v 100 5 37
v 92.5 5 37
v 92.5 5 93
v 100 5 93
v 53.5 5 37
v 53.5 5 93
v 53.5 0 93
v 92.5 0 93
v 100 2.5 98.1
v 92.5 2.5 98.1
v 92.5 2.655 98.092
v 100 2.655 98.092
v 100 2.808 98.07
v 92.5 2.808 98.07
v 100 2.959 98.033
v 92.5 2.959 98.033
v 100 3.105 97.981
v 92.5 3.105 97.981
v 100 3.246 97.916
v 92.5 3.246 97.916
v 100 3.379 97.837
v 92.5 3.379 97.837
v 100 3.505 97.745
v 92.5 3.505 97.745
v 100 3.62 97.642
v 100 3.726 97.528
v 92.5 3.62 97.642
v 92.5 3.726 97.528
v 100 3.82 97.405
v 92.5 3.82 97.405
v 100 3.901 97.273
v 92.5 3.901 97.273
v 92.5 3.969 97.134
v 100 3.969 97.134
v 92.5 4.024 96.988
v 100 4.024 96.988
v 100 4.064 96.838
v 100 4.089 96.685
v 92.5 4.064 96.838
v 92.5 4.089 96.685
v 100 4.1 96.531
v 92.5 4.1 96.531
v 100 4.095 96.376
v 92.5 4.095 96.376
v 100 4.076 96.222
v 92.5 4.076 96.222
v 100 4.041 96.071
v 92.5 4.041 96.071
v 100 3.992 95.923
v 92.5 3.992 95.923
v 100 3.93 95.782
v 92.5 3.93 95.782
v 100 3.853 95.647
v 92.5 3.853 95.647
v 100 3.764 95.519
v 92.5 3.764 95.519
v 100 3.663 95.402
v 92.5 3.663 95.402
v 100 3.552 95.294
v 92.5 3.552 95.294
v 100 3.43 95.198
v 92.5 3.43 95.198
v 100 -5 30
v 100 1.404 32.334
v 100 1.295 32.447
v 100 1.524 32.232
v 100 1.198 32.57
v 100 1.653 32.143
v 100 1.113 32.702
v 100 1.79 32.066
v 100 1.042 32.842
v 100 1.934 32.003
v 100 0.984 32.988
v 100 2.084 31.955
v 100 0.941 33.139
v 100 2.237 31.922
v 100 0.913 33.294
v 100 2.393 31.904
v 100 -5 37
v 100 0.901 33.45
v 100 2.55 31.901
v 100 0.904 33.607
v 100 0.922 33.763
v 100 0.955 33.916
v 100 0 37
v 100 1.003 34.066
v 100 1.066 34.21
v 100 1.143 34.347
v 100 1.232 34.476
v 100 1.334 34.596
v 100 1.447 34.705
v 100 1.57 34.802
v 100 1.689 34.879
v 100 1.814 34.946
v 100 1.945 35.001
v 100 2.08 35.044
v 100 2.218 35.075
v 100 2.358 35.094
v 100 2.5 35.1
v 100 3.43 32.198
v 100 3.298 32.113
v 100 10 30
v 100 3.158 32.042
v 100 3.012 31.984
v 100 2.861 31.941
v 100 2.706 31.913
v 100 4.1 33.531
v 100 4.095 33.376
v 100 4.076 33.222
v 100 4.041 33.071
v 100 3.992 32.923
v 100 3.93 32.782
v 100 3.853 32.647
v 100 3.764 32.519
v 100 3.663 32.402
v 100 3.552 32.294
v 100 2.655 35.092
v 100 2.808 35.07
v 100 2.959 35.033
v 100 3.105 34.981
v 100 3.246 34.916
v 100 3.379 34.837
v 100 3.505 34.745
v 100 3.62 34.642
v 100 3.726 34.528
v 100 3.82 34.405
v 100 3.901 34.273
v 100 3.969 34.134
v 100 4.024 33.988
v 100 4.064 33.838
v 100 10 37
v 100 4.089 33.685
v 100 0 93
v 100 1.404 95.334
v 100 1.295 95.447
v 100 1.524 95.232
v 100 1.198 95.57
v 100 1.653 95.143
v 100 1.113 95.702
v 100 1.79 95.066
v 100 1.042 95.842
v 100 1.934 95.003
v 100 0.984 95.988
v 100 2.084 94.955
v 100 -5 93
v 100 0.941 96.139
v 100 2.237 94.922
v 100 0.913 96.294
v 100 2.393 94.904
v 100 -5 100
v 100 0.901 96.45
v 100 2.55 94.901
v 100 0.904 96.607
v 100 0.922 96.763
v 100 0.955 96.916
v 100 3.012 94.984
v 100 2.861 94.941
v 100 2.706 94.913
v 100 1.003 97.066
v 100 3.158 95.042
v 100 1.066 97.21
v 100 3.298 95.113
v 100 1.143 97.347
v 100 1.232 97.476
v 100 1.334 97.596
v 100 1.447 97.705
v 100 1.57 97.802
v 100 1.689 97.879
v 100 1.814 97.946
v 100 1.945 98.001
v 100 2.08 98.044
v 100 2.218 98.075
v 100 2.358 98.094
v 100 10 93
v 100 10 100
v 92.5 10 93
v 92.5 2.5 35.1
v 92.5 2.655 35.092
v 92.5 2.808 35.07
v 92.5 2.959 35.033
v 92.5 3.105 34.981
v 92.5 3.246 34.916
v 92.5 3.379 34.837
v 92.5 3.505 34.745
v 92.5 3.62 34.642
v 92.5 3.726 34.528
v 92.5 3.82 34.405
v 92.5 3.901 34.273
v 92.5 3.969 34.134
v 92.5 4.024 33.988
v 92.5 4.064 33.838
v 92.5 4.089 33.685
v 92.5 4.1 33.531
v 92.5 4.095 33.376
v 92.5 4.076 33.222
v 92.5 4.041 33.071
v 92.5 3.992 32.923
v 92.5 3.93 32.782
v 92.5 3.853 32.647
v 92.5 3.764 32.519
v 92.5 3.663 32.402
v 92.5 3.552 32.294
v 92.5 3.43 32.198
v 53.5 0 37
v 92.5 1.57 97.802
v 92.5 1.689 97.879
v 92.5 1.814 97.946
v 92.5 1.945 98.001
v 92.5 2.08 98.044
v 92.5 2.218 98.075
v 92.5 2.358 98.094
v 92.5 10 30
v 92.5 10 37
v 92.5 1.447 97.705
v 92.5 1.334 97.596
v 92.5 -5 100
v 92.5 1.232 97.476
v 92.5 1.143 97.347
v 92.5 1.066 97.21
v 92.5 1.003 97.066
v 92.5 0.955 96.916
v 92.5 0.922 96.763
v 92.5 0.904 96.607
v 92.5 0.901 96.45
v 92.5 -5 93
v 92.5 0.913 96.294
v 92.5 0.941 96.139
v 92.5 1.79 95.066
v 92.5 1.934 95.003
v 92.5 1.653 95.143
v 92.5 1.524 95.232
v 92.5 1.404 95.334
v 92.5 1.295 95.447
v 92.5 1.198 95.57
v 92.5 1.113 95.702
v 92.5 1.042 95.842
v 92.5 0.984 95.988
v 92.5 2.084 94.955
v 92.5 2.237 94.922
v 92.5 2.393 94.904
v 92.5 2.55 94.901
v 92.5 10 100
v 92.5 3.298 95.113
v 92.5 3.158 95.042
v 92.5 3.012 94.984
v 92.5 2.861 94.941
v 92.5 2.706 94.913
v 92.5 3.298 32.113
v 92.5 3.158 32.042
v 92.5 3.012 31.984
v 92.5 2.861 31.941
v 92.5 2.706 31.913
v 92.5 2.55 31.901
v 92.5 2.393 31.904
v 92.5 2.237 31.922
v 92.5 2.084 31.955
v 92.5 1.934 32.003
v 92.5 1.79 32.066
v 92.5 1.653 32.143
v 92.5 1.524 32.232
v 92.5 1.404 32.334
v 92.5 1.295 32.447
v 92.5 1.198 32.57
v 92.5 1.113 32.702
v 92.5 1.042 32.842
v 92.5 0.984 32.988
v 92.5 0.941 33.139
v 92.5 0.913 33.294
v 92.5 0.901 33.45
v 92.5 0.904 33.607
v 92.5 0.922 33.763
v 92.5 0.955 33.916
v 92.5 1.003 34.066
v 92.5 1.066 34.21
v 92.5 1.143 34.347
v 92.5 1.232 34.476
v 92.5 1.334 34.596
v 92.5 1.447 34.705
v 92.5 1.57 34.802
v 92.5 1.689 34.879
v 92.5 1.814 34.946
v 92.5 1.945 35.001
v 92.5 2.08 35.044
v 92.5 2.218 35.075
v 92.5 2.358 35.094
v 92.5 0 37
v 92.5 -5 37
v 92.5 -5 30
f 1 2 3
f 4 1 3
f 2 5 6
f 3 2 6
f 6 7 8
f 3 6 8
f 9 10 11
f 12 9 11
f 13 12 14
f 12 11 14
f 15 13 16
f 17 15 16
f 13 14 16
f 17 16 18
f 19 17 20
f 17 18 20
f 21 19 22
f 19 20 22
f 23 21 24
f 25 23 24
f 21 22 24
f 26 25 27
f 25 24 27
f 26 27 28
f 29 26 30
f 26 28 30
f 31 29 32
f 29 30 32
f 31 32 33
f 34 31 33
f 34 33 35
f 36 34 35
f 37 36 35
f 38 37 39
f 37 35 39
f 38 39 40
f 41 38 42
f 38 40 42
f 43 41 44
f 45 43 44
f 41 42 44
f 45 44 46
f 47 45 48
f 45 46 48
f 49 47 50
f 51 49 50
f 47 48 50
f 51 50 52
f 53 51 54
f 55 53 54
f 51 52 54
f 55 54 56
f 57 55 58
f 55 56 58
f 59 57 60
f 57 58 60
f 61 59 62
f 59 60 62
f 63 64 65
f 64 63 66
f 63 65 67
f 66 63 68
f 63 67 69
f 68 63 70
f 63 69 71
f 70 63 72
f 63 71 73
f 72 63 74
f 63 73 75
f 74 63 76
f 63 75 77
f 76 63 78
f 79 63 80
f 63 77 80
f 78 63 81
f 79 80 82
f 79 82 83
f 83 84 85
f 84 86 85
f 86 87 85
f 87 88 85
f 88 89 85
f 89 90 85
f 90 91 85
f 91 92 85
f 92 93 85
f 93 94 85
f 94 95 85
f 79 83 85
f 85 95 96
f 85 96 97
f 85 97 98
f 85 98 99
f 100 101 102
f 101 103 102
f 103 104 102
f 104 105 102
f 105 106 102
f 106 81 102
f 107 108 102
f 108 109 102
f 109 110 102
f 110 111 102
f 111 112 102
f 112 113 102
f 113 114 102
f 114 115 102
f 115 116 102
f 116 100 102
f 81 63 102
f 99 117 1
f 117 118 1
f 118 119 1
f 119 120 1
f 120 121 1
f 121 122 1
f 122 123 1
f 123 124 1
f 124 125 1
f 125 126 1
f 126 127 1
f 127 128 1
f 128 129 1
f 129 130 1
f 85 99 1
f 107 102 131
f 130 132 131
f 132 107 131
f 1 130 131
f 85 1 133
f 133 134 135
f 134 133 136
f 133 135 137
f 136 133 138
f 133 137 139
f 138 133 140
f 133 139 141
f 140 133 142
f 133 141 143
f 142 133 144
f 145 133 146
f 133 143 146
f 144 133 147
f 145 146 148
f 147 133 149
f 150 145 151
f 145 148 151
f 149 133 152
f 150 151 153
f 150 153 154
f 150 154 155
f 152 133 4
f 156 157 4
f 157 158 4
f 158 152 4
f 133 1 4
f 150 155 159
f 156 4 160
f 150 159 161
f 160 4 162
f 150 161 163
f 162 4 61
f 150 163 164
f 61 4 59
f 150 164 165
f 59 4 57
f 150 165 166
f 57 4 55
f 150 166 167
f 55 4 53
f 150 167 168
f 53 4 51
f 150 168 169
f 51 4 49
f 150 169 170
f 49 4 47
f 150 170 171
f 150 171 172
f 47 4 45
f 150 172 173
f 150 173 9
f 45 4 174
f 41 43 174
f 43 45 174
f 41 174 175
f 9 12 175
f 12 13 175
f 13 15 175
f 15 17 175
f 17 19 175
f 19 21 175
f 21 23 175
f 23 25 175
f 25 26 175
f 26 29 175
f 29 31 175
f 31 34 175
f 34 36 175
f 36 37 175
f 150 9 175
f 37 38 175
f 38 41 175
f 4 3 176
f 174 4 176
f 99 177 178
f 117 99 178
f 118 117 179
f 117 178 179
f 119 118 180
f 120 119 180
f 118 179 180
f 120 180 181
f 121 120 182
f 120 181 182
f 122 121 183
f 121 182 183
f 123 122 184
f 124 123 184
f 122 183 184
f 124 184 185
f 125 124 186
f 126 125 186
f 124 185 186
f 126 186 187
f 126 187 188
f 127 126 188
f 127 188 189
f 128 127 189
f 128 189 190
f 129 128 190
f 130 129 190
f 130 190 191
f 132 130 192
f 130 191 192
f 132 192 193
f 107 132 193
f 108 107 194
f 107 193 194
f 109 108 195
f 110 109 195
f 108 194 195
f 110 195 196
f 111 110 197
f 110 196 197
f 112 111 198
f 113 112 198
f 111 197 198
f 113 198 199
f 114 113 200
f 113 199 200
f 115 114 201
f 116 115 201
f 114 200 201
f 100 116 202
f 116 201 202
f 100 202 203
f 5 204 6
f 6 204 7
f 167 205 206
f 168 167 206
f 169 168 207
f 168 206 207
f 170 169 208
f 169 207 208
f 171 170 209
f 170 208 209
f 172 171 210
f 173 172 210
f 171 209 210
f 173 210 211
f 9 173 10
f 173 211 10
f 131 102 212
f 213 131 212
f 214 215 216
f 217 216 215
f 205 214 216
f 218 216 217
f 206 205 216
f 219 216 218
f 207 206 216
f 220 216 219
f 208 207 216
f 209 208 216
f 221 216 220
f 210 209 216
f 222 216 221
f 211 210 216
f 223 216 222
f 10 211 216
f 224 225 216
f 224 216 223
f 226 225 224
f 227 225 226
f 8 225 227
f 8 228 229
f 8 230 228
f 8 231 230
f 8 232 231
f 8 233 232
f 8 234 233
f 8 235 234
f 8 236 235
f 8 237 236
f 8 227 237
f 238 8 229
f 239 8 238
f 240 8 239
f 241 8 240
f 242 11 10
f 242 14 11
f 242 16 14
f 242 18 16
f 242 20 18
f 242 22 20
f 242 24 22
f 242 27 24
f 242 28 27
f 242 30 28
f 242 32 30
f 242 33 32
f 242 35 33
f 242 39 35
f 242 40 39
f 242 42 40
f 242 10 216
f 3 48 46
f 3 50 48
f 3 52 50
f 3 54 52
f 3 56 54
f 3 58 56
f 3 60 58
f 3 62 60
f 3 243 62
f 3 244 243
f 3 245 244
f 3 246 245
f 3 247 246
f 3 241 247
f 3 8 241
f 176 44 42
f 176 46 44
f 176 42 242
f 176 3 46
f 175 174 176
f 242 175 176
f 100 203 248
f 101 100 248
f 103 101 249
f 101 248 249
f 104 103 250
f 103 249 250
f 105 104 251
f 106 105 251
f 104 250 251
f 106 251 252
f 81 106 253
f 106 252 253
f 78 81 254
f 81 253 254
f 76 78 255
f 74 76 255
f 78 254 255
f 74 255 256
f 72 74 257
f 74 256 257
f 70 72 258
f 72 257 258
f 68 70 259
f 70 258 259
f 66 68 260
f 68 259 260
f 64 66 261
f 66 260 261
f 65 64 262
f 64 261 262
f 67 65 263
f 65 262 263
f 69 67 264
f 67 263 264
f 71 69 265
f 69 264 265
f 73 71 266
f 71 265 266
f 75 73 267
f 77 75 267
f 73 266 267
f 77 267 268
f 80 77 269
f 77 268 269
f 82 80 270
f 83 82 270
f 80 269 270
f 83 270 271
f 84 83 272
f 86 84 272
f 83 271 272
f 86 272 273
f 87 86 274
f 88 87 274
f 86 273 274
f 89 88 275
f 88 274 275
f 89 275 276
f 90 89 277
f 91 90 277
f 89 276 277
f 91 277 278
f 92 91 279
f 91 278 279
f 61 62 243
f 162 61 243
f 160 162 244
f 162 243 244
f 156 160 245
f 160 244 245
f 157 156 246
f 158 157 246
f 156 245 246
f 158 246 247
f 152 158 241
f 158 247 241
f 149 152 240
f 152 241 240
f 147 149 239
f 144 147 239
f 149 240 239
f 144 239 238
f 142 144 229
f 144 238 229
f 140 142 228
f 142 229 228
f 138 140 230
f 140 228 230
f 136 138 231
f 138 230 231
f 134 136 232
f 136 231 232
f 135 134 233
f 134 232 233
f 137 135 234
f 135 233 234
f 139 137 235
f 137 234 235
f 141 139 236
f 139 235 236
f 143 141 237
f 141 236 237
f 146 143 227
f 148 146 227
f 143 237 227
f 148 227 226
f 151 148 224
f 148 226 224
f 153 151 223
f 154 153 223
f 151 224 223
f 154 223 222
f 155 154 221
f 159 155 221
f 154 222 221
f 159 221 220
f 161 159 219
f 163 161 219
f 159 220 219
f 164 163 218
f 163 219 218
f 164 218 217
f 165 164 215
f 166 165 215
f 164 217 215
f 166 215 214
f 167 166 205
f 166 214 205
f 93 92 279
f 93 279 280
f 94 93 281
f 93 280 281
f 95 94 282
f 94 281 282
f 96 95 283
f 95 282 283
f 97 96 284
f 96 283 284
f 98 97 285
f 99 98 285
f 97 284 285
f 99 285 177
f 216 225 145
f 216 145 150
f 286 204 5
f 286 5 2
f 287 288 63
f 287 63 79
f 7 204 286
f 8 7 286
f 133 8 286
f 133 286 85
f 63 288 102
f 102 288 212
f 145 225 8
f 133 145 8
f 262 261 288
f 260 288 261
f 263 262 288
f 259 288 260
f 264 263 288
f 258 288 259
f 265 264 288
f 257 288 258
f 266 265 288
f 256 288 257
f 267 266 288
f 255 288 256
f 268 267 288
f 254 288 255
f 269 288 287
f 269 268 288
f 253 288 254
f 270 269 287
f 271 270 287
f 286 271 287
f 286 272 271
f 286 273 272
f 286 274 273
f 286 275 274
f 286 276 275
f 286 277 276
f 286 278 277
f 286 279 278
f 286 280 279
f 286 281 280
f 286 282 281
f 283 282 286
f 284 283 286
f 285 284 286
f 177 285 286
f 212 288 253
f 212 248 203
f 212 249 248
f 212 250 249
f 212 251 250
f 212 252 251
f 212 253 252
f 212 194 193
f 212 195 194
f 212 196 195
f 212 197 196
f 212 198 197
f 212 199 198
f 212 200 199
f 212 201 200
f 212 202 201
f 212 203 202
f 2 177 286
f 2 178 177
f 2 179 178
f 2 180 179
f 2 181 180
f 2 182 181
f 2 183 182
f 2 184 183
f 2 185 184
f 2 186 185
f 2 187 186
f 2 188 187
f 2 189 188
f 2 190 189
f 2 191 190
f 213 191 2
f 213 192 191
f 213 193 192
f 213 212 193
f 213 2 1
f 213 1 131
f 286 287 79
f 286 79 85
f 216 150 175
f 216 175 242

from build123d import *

# Parameters (mm, degrees)
SKETCH_1_W          = 100
SKETCH_1_H          = 100
EXTRUDE_1_DEPTH     = 5
SKETCH_2_W          = 30
SKETCH_2_H          = 5
CUT_EXTRUDE_1_DEPTH = 100
CUT_EXTRUDE_2_DEPTH = 5
SKETCH_4_W          = 39
SKETCH_4_H          = 7
CUT_EXTRUDE_3_DEPTH = 5
SKETCH_5_W          = 7.5
SKETCH_5_H          = 5
EXTRUDE_2_DEPTH     = 70
SKETCH_6_W          = 56
SKETCH_6_H          = 5
CUT_EXTRUDE_5_DEPTH = 7.5
SKETCH_7_W          = 7
SKETCH_7_H          = 5
EXTRUDE_3_DEPTH     = 7.5
CUT_EXTRUDE_6_DEPTH = 7.5


with BuildPart() as part:
    # 草图1 → 凸台-拉伸1 (new body)
    with BuildSketch(Plane(origin=(0, 0, 0), x_dir=(1, 0, 0), z_dir=(0, 1, 0))):
        with Locations((50, -50)):
            Rectangle(SKETCH_1_W, SKETCH_1_H)
    extrude(amount=EXTRUDE_1_DEPTH)

    # 草图2 → 切除-拉伸1 (cut)
    with BuildSketch(Plane.ZY):
        with Locations((15, 2.5)):
            Rectangle(SKETCH_2_W, SKETCH_2_H)
    extrude(amount=-CUT_EXTRUDE_1_DEPTH, mode=Mode.SUBTRACT)

    # 草图3 → 切除-拉伸2 (cut)
    with BuildSketch(Plane.XZ):
        Polygon((53.5, 43.5), (53.5, 30), (0, 30), (0, 100), (53.5, 100), align=None)
    extrude(amount=-CUT_EXTRUDE_2_DEPTH, mode=Mode.SUBTRACT)

    # 草图4 → 切除-拉伸3 (cut)
    with BuildSketch(Plane.XZ):
        with Locations((73, 33.5)):
            Rectangle(SKETCH_4_W, SKETCH_4_H)
        with Locations((73, 96.5)):
            Rectangle(SKETCH_4_W, SKETCH_4_H)
    extrude(amount=-CUT_EXTRUDE_3_DEPTH, mode=Mode.SUBTRACT)

    # 草图5 → 凸台-拉伸2 (add)
    with BuildSketch(Plane(origin=(0, 0, 30), x_dir=(-1, 0, 0), z_dir=(0, 0, -1))):
        with Locations((-96.25, 7.5)):
            Rectangle(SKETCH_5_W, SKETCH_5_H)
    extrude(amount=-EXTRUDE_2_DEPTH)

    # 草图6 → 切除-拉伸5 (cut)
    with BuildSketch(Plane.ZY.offset(-92.5)):
        with Locations((65, 7.5)):
            Rectangle(SKETCH_6_W, SKETCH_6_H)
    extrude(amount=-CUT_EXTRUDE_5_DEPTH, mode=Mode.SUBTRACT)

    # 草图7 → 凸台-拉伸3 (add)
    with BuildSketch(Plane.ZY.offset(-92.5)):
        with Locations((33.5, -2.5)):
            Rectangle(SKETCH_7_W, SKETCH_7_H)
        with Locations((96.5, -2.5)):
            Rectangle(SKETCH_7_W, SKETCH_7_H)
    extrude(amount=-EXTRUDE_3_DEPTH)

    # 草图8 → 切除-拉伸6 (cut)
    with BuildSketch(Plane.ZY.offset(-92.5)):
        with BuildLine():
            ThreePointArc((32.198026446, 3.42998111), (32.57001889, 1.198026446), (34.801973554, 1.57001889))
            Line((34.801973554, 1.57001889), (32.198026446, 3.42998111))
        make_face()
        with BuildLine():
            Line((32.198026446, 3.42998111), (34.801973554, 1.57001889))
            ThreePointArc((34.801973554, 1.57001889), (35.023672814, 2.01171611), (35.1, 2.5))
            ThreePointArc((35.1, 2.5), (33.98828389, 4.023672814), (32.198026446, 3.42998111))
        make_face()
        with BuildLine():
            ThreePointArc((98.1, 2.5), (96.98828389, 4.023672814), (95.198026446, 3.42998111))
            Line((95.198026446, 3.42998111), (97.801973554, 1.57001889))
            ThreePointArc((97.801973554, 1.57001889), (98.023672814, 2.01171611), (98.1, 2.5))
        make_face()
        with BuildLine():
            Line((97.801973554, 1.57001889), (95.198026446, 3.42998111))
            ThreePointArc((95.198026446, 3.42998111), (95.57001889, 1.198026446), (97.801973554, 1.57001889))
        make_face()
    extrude(amount=-CUT_EXTRUDE_6_DEPTH, mode=Mode.SUBTRACT)


solid = part.part
